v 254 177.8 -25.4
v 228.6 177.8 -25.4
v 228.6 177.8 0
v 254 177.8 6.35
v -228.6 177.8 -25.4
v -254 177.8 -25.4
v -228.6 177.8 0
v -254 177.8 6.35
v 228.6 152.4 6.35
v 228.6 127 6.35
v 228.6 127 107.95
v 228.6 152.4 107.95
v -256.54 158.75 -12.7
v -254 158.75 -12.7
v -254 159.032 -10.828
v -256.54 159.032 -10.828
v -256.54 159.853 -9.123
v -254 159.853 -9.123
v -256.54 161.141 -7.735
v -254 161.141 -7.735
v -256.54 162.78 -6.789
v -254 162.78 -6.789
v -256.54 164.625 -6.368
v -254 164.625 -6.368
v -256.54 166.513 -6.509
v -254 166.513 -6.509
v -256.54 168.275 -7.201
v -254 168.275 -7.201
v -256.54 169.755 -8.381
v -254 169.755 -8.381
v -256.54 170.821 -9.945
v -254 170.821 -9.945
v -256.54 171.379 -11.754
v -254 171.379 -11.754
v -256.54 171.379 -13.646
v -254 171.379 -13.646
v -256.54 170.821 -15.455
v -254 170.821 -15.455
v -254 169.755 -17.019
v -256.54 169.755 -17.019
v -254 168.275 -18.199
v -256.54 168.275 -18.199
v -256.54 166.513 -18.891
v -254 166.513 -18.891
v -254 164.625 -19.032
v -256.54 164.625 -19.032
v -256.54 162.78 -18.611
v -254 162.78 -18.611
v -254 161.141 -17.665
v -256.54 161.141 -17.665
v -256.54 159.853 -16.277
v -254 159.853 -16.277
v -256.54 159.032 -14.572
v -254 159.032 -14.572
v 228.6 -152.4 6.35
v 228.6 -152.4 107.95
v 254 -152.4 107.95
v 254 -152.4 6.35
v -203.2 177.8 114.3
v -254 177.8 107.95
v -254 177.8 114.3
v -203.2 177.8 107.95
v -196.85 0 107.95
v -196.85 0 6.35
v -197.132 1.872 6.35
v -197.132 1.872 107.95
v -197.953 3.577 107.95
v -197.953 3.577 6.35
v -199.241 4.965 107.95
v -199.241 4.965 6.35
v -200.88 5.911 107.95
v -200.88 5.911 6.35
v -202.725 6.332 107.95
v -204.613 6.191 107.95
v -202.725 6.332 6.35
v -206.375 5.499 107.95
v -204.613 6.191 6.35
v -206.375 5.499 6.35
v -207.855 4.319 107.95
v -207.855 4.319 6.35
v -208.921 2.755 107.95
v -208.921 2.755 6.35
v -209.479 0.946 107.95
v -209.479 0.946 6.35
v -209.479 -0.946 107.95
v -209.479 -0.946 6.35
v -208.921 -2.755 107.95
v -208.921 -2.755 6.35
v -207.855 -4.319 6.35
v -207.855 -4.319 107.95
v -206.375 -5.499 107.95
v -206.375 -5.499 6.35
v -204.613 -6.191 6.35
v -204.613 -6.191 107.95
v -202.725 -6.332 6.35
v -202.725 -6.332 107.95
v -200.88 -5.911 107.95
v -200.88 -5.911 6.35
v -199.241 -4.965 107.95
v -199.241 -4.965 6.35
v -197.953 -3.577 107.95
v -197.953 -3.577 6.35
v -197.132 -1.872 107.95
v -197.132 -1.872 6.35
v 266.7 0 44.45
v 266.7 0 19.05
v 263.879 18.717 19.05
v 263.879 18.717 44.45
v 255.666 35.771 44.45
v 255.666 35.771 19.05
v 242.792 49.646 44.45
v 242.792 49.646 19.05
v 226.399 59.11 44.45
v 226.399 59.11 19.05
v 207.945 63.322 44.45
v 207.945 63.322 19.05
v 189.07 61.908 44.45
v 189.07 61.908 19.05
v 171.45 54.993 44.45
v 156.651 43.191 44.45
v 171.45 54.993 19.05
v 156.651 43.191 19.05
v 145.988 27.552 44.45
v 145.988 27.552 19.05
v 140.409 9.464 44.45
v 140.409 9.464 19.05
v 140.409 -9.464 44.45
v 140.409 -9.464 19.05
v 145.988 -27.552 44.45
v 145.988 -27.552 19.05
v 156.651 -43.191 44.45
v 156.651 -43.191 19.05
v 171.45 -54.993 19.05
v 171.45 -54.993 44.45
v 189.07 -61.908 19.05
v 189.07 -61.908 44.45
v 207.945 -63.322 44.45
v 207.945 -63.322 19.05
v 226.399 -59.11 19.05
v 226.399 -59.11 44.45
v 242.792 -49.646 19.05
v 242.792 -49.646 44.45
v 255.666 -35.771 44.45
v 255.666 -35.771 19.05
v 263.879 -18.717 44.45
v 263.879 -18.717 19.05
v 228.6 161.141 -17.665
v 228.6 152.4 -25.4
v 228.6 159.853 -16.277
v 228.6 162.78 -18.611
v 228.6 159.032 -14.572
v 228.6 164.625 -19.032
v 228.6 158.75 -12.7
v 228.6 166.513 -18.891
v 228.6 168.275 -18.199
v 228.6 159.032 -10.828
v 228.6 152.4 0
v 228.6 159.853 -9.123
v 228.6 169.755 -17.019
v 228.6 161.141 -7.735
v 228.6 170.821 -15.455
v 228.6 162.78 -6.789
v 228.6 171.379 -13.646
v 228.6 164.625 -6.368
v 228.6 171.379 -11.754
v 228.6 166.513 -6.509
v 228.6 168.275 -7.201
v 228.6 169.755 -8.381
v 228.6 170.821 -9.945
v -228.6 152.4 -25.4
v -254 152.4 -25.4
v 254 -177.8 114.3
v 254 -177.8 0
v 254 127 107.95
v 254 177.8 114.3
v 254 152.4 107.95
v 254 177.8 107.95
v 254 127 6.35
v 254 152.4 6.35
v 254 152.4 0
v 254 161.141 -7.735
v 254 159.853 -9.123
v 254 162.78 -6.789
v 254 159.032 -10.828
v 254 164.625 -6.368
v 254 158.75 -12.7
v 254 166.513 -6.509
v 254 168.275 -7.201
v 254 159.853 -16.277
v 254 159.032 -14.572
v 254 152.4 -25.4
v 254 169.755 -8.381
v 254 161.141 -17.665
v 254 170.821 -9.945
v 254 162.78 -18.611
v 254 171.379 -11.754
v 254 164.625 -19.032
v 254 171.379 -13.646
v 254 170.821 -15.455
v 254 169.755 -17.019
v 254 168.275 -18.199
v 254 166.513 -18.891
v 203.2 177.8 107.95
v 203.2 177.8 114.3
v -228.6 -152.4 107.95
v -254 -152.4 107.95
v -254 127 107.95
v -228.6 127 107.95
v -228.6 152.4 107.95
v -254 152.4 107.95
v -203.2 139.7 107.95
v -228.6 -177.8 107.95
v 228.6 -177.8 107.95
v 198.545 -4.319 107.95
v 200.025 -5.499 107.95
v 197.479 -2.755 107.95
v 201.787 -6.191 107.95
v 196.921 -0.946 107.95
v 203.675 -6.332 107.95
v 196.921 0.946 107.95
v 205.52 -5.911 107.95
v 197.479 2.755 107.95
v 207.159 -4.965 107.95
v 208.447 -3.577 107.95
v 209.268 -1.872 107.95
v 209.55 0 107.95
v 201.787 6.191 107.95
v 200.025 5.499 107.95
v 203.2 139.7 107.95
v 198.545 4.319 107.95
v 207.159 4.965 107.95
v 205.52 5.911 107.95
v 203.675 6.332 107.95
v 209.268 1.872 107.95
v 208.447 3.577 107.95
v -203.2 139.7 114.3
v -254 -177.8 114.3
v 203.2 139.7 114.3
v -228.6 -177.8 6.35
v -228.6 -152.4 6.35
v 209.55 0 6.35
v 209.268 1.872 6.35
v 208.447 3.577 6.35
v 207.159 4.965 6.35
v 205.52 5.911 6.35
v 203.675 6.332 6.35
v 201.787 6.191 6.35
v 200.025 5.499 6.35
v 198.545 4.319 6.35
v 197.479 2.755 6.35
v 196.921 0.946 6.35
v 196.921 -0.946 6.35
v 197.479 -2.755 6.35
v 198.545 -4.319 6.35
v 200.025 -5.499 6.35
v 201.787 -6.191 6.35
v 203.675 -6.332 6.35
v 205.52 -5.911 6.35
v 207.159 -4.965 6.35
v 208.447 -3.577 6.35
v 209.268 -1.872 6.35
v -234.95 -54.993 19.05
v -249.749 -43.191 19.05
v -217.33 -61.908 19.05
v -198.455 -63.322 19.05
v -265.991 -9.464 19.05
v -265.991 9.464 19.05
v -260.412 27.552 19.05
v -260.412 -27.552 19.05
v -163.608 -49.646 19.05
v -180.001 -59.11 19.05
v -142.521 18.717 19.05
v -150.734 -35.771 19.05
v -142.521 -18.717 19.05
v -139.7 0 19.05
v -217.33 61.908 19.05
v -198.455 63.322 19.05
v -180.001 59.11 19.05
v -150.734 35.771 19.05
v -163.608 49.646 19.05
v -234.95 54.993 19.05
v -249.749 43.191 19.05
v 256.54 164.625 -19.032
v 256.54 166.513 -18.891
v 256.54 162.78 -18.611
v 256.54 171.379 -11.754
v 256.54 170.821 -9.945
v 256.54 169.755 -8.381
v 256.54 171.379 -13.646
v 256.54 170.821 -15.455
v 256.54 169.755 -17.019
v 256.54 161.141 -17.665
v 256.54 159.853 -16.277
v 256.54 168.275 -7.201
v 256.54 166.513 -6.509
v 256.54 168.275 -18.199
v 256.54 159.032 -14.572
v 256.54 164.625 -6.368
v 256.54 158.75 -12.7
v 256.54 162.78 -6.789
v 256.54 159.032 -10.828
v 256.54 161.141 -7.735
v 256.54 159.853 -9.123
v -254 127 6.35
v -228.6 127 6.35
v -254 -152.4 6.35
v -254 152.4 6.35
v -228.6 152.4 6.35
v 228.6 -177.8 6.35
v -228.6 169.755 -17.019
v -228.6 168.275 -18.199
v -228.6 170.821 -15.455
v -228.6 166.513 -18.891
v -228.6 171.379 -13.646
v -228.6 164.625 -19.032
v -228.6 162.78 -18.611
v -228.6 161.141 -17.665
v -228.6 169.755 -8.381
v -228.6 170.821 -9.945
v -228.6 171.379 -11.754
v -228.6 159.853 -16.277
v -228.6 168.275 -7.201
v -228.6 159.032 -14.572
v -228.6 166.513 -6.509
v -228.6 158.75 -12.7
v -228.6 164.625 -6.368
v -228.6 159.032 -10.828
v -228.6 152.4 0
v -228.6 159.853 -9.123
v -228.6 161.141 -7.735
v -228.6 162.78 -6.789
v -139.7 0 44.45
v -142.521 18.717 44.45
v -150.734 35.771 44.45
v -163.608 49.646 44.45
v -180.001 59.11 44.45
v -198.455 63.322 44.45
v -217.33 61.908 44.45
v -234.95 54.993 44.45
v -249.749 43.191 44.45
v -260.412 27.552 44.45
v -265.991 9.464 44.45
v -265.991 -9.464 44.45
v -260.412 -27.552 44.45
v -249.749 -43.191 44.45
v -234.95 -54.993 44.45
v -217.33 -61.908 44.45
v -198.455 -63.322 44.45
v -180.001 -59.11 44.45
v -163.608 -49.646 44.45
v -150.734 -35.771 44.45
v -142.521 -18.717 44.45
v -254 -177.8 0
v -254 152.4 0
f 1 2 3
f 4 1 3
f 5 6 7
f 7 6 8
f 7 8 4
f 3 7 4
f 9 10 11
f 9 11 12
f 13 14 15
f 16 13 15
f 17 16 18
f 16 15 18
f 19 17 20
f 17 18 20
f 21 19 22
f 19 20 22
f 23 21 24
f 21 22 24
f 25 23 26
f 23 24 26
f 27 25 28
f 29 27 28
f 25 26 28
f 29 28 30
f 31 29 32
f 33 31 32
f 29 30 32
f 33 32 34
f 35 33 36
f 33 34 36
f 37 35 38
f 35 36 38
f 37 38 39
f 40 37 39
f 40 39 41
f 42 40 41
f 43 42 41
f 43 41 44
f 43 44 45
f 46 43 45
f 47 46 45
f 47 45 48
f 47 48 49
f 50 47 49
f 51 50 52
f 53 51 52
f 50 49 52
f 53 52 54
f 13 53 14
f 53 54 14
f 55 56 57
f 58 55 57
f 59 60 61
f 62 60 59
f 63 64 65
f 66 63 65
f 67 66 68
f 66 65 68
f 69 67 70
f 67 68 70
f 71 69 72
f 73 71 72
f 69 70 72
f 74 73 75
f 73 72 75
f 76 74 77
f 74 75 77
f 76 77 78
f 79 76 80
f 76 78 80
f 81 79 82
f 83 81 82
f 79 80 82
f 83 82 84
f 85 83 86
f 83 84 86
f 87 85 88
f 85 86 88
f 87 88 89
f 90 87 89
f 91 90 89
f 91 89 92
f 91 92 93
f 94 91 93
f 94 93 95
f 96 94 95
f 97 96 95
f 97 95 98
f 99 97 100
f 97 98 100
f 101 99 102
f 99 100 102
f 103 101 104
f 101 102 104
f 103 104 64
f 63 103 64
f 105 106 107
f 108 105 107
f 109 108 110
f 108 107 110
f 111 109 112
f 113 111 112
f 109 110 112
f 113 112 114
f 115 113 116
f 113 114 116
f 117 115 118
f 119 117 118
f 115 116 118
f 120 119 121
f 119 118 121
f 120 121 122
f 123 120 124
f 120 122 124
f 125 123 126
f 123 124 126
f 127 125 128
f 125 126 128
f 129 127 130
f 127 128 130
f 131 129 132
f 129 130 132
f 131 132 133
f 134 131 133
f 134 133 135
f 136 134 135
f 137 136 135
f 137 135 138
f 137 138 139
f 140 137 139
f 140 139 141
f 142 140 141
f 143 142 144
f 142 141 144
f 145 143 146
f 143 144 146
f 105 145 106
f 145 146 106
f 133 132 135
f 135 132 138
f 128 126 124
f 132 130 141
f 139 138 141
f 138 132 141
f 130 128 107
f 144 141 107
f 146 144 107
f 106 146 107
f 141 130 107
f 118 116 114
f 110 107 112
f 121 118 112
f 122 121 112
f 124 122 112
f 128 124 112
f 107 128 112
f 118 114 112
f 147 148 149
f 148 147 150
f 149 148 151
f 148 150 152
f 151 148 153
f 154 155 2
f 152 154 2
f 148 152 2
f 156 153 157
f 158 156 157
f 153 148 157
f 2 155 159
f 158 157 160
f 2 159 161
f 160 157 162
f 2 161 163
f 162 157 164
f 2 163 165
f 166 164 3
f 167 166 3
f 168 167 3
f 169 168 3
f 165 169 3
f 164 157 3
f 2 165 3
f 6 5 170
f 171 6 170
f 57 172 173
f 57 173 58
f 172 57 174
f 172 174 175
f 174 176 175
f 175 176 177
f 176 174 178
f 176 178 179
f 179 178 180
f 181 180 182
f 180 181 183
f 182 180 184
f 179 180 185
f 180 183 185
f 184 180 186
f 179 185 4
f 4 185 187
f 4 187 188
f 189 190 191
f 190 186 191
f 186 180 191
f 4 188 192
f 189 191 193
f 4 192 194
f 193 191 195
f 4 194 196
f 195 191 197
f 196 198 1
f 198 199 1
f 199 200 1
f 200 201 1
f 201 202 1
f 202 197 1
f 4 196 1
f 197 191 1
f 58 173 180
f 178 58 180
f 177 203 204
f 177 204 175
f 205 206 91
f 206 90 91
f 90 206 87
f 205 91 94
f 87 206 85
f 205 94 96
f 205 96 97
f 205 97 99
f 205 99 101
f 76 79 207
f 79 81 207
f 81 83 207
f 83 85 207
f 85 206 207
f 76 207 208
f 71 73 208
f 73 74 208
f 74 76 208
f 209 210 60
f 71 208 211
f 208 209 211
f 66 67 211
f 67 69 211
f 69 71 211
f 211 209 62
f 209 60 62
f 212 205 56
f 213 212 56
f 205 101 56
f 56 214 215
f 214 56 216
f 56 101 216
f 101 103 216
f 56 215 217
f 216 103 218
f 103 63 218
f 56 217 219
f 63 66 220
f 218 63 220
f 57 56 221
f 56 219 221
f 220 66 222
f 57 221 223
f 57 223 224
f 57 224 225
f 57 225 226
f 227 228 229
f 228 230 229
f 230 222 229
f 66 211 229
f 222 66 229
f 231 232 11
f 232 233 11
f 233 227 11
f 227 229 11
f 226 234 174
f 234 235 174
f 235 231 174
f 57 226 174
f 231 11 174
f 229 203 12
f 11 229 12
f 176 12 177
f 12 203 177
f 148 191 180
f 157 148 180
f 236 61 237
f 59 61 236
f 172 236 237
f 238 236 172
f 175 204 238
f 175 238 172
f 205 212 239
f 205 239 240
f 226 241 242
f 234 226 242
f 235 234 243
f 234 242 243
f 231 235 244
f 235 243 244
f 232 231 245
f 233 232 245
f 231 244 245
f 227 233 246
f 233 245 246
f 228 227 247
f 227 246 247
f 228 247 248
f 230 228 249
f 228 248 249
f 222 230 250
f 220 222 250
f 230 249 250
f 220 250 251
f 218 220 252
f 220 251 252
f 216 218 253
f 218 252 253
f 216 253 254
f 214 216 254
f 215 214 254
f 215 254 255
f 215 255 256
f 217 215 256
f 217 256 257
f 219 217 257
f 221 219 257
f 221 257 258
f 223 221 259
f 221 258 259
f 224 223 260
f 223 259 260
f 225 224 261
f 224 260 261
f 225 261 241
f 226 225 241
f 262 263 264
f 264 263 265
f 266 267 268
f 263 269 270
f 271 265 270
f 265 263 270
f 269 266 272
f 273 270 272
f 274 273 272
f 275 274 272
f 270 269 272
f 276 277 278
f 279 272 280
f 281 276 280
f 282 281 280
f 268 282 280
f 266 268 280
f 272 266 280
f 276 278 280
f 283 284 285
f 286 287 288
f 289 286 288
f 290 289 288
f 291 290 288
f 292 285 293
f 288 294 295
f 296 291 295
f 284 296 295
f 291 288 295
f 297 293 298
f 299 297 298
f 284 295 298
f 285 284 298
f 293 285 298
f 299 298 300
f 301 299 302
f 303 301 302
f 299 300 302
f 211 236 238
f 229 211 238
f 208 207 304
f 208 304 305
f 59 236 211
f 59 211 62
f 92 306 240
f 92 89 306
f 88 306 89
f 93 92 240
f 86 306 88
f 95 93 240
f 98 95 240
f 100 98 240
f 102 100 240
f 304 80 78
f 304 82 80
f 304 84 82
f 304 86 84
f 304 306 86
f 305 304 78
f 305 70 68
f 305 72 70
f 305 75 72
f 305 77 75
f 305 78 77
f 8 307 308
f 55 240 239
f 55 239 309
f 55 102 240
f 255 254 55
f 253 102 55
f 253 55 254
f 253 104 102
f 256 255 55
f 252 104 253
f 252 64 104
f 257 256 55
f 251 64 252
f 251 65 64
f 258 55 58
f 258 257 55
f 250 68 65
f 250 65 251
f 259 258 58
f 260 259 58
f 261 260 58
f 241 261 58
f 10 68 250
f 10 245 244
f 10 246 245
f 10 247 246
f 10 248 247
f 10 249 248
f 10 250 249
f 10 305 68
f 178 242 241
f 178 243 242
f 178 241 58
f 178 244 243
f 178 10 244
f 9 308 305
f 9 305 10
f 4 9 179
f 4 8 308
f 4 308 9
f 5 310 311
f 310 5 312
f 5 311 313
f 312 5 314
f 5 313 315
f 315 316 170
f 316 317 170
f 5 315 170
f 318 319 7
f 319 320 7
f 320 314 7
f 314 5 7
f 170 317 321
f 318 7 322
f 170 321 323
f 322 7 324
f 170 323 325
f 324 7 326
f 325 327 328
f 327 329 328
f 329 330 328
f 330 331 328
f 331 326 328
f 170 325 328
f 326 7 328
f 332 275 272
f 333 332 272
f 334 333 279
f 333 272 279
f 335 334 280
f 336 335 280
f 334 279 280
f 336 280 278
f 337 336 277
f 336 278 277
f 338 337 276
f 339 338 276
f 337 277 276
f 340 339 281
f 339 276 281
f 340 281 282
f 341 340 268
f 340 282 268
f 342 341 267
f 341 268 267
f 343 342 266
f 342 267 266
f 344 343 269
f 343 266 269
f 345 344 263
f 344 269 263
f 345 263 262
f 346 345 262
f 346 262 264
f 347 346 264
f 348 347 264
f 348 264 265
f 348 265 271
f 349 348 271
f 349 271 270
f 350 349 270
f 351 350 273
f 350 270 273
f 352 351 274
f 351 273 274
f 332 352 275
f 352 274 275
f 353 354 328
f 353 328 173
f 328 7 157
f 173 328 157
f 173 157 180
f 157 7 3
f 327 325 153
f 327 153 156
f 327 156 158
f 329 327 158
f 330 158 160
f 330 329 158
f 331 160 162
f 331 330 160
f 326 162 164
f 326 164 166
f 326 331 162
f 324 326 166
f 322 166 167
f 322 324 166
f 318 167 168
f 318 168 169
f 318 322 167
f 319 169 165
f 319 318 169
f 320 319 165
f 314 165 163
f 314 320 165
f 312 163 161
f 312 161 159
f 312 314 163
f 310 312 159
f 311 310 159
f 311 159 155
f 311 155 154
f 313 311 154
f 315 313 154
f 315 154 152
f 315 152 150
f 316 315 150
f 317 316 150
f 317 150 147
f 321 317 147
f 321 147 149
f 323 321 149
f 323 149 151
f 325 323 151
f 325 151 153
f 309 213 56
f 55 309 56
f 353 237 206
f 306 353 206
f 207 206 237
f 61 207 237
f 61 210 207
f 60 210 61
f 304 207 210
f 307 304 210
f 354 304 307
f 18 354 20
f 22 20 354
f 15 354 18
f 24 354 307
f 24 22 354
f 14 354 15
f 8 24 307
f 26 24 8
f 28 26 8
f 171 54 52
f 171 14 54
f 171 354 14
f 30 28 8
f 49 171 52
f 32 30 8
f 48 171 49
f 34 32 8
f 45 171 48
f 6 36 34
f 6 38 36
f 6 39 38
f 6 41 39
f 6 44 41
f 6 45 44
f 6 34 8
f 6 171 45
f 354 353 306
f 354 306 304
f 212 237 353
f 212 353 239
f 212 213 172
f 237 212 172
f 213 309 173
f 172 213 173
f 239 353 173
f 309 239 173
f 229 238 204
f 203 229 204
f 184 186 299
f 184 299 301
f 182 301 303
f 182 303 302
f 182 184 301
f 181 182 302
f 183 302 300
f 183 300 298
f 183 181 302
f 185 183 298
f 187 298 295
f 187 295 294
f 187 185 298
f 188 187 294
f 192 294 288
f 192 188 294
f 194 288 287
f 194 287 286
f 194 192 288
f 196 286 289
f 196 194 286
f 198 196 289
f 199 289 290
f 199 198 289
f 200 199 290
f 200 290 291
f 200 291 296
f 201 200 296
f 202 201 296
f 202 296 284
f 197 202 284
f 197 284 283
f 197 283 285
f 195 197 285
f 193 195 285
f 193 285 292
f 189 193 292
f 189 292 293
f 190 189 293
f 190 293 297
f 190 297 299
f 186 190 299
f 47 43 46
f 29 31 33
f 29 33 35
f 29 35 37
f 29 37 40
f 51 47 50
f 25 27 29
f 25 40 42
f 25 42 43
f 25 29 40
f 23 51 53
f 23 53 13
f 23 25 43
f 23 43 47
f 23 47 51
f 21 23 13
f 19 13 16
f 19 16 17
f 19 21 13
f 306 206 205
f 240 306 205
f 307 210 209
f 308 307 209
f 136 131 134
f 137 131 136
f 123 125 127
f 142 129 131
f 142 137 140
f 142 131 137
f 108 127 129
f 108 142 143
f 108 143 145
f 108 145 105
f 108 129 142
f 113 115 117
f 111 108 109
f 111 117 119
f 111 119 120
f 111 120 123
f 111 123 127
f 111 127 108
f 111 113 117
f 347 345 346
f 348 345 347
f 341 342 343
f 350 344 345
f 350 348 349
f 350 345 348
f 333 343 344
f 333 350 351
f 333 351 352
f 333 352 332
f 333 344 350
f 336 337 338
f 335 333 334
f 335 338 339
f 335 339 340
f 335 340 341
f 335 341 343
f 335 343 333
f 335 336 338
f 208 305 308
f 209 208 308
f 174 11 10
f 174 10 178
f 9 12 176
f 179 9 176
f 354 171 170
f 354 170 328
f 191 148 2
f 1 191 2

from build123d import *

# Parameters (mm, degrees)
F0_W          = 508
F0_H          = 355.6
F1_DEPTH      = 6.35
F2_W          = 25.4
F2_H          = 25.4
F3_DEPTH      = 25.4
F4_W          = 25.4
F4_H          = 25.4
F5_DEPTH      = 25.4
F6_R          = 6.35
F7_DEPTH      = 2.54
F7_DEPTH_BACK = 510.54
F8_W          = 25.4
F8_H          = 25.4
F9_DEPTH      = 101.6
F10_W         = 508
F10_H         = 355.6
F11_DEPTH     = 6.35
F13_START     = 12.7
F12_R         = 63.5
F13_DEPTH     = 25.4
F14_R         = 6.35
F15_DEPTH     = 101.6
F16_W         = 406.4
F16_H         = 38.1
F17_DEPTH     = 6.35


with BuildPart() as f1:
    # F0 (on Top) → F1 (new body)
    with BuildSketch(Plane.XY):
        Rectangle(F0_W, F0_H)
    extrude(amount=F1_DEPTH)

    # F2 (on face) → F3 (join)
    with BuildSketch(Plane.YZ.offset(254)):
        with Locations((165.1, -12.7)):
            Rectangle(F2_W, F2_H)
    extrude(amount=-F3_DEPTH)

    # F4 (on face) → F5 (join)
    with BuildSketch(Plane(origin=(-254, 0, 0), x_dir=(0, -1, 0), z_dir=(-1, 0, 0))):
        with Locations((-165.1, -12.7)):
            Rectangle(F4_W, F4_H)
    extrude(amount=-F5_DEPTH)

    # F6 (on face) → F7 (join, two sides)
    with BuildSketch(Plane(origin=(-254, 0, 0), x_dir=(0, -1, 0), z_dir=(-1, 0, 0))) as f7_sk:
        with Locations((-165.1, -12.7)):
            Circle(F6_R)
    extrude(amount=F7_DEPTH)
    extrude(f7_sk.sketch, amount=-F7_DEPTH_BACK)

    # F8 (on face) → F9 (join)
    with BuildSketch(Plane.XY.offset(6.35)):
        with Locations((241.3, -165.1)):
            Rectangle(F8_W, F8_H)
        with Locations((-241.3, -165.1)):
            Rectangle(F8_W, F8_H)
        with Locations((241.3, 139.7)):
            Rectangle(F8_W, F8_H)
        with Locations((-241.3, 139.7)):
            Rectangle(F8_W, F8_H)
    extrude(amount=F9_DEPTH)

    # F10 (on face) → F11 (join)
    with BuildSketch(Plane.XY.offset(107.95)):
        Rectangle(F10_W, F10_H)
    extrude(amount=F11_DEPTH)

    # F14 (on face) → F15 (join)
    with BuildSketch(Plane.XY.offset(6.35)):
        with Locations((203.2, 0)):
            Circle(F14_R)
        with Locations((-203.2, 0)):
            Circle(F14_R)
    extrude(amount=F15_DEPTH)

    # F16 (on face) → F17 (cut)
    with BuildSketch(Plane.XY.offset(114.3)):
        with Locations((0, 158.75)):
            Rectangle(F16_W, F16_H)
    extrude(amount=-F17_DEPTH, mode=Mode.SUBTRACT)


with BuildPart() as f13:
    # F12 (on face) → F13 (new body)
    with BuildSketch(Plane.XY.offset(6.35).offset(F13_START)):
        with Locations((-203.2, 0)):
            Circle(F12_R)
    extrude(amount=F13_DEPTH)


with BuildPart() as f13b:
    # F12 (on face) → F13, piece 2 (new body)
    with BuildSketch(Plane.XY.offset(6.35).offset(F13_START)):
        with Locations((203.2, 0)):
            Circle(F12_R)
    extrude(amount=F13_DEPTH)


solid = Compound([f1.part, f13.part, f13b.part])
